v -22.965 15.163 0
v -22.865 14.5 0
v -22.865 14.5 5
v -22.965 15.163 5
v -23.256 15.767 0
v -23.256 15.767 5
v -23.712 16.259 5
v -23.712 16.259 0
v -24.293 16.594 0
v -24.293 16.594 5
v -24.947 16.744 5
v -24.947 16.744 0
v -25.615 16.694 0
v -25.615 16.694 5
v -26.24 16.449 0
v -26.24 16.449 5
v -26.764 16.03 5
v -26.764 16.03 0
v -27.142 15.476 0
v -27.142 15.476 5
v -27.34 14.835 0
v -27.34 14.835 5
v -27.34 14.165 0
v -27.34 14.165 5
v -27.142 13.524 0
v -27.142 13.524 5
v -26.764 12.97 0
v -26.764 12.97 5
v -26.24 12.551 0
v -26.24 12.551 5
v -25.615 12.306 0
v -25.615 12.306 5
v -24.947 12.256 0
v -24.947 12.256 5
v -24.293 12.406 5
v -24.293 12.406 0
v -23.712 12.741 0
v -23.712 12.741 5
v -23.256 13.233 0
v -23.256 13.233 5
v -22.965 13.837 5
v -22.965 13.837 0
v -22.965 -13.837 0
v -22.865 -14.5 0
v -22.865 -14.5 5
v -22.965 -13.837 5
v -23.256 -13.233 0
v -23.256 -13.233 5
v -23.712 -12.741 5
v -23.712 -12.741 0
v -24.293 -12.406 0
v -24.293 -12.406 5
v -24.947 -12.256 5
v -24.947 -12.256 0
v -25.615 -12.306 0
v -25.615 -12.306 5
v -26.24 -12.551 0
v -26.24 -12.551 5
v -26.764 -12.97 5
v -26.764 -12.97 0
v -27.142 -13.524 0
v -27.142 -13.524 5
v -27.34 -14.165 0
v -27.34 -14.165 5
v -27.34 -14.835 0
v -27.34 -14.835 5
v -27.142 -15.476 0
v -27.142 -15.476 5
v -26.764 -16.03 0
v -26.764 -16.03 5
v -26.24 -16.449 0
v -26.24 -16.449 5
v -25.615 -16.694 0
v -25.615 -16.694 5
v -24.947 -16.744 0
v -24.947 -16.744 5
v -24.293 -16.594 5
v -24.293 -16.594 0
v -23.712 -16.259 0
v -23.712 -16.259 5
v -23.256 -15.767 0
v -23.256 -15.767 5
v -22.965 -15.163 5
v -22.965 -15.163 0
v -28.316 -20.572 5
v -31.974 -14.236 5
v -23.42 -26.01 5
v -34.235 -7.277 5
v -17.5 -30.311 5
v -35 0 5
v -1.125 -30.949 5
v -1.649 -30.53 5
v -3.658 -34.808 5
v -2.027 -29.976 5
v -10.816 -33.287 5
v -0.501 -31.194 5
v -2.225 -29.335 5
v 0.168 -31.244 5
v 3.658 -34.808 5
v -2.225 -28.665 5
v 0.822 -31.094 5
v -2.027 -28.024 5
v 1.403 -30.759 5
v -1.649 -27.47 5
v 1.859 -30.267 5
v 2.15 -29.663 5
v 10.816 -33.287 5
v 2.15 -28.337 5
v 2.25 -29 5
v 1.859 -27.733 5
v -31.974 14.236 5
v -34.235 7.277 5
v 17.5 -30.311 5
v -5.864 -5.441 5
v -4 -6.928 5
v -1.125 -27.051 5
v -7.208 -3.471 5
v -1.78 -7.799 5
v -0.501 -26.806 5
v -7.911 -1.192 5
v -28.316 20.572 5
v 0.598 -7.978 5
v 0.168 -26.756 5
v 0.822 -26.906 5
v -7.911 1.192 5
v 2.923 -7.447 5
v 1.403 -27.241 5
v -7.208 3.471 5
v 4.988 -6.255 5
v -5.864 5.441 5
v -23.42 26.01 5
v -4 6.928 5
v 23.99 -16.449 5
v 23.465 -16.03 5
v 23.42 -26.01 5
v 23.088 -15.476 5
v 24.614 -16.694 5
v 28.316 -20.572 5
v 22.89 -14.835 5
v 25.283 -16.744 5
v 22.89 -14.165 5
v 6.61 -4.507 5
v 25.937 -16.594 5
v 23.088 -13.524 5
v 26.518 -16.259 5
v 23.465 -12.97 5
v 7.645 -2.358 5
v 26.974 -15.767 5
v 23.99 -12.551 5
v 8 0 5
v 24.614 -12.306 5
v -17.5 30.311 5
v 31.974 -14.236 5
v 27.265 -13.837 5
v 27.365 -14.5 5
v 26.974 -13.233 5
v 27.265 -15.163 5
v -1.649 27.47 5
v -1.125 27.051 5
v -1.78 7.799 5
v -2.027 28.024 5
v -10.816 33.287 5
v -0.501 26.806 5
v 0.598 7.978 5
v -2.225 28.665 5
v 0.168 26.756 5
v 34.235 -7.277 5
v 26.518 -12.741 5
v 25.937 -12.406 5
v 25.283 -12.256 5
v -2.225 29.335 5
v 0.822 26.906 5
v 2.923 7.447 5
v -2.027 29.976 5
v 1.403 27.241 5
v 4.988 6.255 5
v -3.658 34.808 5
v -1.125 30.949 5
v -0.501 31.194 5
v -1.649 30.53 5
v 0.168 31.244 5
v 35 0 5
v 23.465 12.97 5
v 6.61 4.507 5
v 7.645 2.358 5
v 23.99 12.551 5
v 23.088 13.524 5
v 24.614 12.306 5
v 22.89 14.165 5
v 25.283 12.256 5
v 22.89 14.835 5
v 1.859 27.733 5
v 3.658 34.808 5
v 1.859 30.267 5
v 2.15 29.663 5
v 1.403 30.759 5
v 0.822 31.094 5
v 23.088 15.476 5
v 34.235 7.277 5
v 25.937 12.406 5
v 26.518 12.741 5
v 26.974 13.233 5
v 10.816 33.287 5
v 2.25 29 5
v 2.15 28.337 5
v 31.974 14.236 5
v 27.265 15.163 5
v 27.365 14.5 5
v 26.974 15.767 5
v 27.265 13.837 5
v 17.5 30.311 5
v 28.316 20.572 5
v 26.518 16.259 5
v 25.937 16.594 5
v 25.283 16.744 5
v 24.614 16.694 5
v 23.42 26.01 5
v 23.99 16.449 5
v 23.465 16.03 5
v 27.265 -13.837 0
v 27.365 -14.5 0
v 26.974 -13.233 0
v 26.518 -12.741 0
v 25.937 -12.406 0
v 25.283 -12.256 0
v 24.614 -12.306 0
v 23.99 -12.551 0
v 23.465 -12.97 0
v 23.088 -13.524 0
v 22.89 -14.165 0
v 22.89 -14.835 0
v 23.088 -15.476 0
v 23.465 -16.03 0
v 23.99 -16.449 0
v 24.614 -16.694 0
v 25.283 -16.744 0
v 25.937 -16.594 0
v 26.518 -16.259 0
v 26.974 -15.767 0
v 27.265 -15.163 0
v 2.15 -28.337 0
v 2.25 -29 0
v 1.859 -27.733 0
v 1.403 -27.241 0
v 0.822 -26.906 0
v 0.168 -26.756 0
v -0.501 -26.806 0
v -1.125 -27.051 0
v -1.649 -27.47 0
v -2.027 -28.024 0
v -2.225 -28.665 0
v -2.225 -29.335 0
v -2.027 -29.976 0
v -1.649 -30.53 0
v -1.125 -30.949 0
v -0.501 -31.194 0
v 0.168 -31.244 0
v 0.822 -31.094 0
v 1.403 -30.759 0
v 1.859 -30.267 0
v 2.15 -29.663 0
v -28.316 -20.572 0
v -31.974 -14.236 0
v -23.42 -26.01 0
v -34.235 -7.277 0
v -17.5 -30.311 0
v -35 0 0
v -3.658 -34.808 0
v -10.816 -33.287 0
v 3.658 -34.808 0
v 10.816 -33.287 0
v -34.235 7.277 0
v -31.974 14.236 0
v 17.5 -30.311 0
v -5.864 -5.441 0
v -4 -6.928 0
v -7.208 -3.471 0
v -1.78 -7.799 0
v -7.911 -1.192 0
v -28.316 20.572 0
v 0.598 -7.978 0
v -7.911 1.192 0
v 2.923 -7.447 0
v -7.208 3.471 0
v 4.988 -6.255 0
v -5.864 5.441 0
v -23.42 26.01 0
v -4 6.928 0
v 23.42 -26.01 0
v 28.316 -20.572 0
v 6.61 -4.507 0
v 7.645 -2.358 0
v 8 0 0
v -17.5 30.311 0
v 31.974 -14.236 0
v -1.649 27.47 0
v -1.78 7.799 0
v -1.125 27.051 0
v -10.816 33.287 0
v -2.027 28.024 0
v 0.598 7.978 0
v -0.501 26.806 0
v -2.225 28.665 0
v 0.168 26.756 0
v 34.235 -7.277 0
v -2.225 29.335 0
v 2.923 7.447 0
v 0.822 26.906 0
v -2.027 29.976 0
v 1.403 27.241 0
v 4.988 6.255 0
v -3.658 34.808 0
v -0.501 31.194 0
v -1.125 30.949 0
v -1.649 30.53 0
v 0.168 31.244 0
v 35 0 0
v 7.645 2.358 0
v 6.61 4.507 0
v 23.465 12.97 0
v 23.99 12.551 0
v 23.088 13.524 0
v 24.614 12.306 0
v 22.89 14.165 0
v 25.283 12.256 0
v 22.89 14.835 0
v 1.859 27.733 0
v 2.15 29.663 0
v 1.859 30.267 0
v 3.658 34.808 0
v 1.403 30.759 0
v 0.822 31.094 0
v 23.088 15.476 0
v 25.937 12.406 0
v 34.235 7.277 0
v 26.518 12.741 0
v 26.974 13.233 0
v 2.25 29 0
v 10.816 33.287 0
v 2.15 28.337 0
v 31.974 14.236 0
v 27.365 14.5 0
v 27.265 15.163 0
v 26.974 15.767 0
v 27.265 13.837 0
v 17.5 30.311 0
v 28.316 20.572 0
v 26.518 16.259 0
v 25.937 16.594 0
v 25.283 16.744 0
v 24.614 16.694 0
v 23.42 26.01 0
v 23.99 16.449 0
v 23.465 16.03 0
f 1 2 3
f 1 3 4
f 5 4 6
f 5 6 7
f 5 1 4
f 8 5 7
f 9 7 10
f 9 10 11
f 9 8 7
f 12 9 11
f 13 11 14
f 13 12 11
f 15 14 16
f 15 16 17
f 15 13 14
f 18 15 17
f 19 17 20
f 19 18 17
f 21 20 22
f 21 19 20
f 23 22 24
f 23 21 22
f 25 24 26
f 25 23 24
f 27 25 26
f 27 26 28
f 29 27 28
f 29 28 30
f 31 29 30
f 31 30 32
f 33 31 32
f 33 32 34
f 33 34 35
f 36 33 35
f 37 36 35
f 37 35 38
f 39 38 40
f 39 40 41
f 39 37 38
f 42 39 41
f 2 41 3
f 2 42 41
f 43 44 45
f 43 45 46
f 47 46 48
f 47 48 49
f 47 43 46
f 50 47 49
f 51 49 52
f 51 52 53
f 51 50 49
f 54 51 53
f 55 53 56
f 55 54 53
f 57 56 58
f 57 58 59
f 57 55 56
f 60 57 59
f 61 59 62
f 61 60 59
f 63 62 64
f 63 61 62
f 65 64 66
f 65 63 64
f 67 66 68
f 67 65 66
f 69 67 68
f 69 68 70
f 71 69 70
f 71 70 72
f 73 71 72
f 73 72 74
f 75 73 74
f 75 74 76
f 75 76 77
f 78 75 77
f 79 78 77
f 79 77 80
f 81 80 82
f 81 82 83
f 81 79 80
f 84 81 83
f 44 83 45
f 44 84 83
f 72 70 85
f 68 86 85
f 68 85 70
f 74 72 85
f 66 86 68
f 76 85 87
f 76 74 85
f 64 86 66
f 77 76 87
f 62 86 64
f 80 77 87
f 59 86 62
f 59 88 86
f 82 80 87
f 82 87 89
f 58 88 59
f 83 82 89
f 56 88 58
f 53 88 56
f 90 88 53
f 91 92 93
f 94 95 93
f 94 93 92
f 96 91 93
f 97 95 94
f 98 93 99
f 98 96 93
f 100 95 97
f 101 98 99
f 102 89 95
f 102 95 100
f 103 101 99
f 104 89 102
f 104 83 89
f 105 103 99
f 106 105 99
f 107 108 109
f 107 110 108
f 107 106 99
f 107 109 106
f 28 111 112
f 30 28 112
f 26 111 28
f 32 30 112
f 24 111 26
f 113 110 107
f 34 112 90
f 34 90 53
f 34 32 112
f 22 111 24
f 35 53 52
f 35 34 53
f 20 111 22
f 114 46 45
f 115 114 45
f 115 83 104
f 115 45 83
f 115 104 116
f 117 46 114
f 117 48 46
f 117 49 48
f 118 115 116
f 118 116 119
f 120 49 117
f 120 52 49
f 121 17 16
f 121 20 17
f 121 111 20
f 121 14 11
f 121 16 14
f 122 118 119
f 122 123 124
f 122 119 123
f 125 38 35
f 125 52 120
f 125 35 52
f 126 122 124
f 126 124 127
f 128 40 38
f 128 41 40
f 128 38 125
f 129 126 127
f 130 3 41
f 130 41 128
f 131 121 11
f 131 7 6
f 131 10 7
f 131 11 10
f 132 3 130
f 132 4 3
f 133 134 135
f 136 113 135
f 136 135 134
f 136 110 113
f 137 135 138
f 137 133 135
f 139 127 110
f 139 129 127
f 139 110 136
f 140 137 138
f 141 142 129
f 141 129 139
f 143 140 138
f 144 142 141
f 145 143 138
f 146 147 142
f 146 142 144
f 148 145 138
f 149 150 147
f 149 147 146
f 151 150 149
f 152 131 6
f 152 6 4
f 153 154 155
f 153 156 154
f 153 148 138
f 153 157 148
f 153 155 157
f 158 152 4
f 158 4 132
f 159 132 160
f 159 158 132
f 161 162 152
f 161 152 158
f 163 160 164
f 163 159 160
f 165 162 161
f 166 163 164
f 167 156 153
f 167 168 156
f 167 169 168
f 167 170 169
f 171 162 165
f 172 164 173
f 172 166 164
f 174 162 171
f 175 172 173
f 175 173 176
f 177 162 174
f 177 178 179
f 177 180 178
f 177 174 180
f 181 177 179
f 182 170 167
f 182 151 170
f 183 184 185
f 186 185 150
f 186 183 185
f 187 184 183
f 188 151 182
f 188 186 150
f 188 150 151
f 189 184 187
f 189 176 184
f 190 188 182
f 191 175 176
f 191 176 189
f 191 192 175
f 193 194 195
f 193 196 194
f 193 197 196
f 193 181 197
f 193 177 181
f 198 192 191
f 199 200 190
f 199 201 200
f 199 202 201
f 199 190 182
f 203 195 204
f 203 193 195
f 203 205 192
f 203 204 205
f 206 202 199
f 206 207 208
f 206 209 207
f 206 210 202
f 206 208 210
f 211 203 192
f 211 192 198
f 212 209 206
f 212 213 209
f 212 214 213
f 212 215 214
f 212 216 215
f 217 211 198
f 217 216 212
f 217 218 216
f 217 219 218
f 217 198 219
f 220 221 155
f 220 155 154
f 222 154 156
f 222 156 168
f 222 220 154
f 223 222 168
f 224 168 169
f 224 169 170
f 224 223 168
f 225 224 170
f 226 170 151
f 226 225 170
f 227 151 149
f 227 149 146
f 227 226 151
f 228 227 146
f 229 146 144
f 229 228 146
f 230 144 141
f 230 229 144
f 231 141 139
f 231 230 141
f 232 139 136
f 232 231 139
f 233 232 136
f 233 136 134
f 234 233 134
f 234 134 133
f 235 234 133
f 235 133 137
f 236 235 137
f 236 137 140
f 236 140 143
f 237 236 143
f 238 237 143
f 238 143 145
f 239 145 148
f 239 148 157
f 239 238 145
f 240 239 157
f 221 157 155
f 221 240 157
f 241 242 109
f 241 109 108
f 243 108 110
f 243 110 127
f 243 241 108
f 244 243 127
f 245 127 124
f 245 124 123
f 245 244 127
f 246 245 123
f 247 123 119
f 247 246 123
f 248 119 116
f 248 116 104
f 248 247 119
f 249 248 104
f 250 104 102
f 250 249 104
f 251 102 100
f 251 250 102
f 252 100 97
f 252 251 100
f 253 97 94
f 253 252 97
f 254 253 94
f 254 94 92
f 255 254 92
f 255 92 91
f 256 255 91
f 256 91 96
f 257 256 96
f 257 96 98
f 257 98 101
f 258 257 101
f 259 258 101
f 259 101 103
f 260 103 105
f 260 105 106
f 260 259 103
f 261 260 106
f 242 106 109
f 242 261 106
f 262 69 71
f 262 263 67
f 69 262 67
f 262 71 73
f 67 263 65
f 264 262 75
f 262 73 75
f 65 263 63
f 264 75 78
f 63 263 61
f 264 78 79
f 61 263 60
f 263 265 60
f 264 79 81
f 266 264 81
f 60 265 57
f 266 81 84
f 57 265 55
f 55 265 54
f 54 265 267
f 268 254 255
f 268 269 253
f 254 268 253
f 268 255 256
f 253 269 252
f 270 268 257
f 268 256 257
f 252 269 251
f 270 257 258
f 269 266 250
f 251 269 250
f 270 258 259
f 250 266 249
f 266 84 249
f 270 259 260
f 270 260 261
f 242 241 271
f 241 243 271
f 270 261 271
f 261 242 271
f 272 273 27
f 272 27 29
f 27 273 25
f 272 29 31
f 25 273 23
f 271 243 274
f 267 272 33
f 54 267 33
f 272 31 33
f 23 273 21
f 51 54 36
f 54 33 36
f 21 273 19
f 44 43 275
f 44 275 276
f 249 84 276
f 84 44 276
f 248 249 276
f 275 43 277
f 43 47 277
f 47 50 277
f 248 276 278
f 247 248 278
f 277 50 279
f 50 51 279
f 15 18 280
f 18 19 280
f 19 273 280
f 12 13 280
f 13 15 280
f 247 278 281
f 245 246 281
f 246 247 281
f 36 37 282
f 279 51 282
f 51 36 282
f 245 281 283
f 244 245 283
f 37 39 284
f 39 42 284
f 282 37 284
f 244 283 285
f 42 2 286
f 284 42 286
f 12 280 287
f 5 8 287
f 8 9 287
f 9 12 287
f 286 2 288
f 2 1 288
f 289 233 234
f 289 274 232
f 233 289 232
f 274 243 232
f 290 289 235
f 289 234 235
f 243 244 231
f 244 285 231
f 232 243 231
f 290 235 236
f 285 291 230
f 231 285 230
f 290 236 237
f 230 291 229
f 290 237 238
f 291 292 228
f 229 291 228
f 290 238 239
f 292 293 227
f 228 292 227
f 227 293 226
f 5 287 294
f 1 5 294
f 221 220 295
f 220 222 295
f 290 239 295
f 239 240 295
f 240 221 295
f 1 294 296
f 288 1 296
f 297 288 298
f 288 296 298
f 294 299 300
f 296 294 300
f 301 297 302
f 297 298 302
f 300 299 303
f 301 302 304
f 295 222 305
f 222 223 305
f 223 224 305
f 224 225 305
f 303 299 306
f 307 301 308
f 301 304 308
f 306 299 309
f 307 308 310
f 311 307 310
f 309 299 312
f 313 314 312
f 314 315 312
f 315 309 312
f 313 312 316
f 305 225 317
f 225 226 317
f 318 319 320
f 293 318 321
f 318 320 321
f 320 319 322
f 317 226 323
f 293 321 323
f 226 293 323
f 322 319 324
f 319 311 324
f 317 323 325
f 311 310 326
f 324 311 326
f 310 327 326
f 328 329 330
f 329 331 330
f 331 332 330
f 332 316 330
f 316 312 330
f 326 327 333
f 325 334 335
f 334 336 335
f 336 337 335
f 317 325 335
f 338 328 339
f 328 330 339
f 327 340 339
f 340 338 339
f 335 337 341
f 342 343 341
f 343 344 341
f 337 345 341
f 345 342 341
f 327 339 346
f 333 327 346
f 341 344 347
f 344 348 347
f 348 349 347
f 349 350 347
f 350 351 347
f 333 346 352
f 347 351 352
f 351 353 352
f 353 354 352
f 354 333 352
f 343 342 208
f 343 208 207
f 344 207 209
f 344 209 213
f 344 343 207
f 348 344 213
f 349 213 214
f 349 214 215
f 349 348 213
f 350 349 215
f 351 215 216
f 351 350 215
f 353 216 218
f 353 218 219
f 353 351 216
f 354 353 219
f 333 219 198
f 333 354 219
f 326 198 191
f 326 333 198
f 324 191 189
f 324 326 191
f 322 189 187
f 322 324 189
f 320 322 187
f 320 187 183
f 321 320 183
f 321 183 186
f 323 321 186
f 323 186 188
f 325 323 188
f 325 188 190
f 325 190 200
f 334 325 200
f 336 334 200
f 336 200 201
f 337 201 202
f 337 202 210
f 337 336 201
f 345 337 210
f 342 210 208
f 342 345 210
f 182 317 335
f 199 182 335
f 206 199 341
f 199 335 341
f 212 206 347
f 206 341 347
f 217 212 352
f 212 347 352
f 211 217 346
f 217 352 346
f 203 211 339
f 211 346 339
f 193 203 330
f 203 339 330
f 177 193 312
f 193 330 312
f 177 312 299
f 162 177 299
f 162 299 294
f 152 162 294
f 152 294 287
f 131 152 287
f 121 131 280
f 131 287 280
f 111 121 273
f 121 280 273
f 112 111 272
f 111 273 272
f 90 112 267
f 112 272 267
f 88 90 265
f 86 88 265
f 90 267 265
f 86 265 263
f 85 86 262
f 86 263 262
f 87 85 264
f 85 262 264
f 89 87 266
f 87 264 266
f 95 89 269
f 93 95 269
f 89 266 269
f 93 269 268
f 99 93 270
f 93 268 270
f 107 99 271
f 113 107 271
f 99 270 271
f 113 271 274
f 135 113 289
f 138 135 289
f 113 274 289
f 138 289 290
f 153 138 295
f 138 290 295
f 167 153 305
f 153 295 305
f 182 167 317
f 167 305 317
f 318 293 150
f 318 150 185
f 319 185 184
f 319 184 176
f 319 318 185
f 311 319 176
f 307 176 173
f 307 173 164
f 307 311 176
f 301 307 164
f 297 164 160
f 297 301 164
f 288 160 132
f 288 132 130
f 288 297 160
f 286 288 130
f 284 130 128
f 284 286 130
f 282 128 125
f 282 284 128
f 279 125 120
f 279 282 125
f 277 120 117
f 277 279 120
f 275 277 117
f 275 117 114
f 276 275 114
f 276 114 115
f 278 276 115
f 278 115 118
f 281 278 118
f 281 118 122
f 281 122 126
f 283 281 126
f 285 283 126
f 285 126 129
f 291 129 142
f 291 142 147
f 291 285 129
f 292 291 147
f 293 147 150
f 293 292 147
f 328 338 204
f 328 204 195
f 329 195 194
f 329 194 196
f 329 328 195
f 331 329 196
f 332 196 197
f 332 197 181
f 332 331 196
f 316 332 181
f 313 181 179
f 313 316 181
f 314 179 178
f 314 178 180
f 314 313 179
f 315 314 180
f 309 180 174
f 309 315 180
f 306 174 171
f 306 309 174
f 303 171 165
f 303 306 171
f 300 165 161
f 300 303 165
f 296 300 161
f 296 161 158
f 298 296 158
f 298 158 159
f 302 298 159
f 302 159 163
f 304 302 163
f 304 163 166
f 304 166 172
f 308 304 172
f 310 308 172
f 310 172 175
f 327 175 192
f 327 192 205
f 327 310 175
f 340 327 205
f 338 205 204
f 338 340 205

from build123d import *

# Parameters (mm, degrees)
F0_R     = 35
F0_R_2   = 2.25
F0_R_3   = 8
F1_DEPTH = 5


with BuildPart() as f1:
    # F0 (on Top) → F1 (new body)
    with BuildSketch(Plane.XY):
        Circle(F0_R)
        with Locations((-25.114737, -14.5)):
            Circle(F0_R_2, mode=Mode.SUBTRACT)
        with Locations((0, -29)):
            Circle(F0_R_2, mode=Mode.SUBTRACT)
        with Locations((25.114737, -14.5)):
            Circle(F0_R_2, mode=Mode.SUBTRACT)
        with Locations((-25.114737, 14.5)):
            Circle(F0_R_2, mode=Mode.SUBTRACT)
        Circle(F0_R_3, mode=Mode.SUBTRACT)
        with Locations((25.114737, 14.5)):
            Circle(F0_R_2, mode=Mode.SUBTRACT)
        with Locations((0, 29)):
            Circle(F0_R_2, mode=Mode.SUBTRACT)
    extrude(amount=F1_DEPTH)


solid = f1.part
